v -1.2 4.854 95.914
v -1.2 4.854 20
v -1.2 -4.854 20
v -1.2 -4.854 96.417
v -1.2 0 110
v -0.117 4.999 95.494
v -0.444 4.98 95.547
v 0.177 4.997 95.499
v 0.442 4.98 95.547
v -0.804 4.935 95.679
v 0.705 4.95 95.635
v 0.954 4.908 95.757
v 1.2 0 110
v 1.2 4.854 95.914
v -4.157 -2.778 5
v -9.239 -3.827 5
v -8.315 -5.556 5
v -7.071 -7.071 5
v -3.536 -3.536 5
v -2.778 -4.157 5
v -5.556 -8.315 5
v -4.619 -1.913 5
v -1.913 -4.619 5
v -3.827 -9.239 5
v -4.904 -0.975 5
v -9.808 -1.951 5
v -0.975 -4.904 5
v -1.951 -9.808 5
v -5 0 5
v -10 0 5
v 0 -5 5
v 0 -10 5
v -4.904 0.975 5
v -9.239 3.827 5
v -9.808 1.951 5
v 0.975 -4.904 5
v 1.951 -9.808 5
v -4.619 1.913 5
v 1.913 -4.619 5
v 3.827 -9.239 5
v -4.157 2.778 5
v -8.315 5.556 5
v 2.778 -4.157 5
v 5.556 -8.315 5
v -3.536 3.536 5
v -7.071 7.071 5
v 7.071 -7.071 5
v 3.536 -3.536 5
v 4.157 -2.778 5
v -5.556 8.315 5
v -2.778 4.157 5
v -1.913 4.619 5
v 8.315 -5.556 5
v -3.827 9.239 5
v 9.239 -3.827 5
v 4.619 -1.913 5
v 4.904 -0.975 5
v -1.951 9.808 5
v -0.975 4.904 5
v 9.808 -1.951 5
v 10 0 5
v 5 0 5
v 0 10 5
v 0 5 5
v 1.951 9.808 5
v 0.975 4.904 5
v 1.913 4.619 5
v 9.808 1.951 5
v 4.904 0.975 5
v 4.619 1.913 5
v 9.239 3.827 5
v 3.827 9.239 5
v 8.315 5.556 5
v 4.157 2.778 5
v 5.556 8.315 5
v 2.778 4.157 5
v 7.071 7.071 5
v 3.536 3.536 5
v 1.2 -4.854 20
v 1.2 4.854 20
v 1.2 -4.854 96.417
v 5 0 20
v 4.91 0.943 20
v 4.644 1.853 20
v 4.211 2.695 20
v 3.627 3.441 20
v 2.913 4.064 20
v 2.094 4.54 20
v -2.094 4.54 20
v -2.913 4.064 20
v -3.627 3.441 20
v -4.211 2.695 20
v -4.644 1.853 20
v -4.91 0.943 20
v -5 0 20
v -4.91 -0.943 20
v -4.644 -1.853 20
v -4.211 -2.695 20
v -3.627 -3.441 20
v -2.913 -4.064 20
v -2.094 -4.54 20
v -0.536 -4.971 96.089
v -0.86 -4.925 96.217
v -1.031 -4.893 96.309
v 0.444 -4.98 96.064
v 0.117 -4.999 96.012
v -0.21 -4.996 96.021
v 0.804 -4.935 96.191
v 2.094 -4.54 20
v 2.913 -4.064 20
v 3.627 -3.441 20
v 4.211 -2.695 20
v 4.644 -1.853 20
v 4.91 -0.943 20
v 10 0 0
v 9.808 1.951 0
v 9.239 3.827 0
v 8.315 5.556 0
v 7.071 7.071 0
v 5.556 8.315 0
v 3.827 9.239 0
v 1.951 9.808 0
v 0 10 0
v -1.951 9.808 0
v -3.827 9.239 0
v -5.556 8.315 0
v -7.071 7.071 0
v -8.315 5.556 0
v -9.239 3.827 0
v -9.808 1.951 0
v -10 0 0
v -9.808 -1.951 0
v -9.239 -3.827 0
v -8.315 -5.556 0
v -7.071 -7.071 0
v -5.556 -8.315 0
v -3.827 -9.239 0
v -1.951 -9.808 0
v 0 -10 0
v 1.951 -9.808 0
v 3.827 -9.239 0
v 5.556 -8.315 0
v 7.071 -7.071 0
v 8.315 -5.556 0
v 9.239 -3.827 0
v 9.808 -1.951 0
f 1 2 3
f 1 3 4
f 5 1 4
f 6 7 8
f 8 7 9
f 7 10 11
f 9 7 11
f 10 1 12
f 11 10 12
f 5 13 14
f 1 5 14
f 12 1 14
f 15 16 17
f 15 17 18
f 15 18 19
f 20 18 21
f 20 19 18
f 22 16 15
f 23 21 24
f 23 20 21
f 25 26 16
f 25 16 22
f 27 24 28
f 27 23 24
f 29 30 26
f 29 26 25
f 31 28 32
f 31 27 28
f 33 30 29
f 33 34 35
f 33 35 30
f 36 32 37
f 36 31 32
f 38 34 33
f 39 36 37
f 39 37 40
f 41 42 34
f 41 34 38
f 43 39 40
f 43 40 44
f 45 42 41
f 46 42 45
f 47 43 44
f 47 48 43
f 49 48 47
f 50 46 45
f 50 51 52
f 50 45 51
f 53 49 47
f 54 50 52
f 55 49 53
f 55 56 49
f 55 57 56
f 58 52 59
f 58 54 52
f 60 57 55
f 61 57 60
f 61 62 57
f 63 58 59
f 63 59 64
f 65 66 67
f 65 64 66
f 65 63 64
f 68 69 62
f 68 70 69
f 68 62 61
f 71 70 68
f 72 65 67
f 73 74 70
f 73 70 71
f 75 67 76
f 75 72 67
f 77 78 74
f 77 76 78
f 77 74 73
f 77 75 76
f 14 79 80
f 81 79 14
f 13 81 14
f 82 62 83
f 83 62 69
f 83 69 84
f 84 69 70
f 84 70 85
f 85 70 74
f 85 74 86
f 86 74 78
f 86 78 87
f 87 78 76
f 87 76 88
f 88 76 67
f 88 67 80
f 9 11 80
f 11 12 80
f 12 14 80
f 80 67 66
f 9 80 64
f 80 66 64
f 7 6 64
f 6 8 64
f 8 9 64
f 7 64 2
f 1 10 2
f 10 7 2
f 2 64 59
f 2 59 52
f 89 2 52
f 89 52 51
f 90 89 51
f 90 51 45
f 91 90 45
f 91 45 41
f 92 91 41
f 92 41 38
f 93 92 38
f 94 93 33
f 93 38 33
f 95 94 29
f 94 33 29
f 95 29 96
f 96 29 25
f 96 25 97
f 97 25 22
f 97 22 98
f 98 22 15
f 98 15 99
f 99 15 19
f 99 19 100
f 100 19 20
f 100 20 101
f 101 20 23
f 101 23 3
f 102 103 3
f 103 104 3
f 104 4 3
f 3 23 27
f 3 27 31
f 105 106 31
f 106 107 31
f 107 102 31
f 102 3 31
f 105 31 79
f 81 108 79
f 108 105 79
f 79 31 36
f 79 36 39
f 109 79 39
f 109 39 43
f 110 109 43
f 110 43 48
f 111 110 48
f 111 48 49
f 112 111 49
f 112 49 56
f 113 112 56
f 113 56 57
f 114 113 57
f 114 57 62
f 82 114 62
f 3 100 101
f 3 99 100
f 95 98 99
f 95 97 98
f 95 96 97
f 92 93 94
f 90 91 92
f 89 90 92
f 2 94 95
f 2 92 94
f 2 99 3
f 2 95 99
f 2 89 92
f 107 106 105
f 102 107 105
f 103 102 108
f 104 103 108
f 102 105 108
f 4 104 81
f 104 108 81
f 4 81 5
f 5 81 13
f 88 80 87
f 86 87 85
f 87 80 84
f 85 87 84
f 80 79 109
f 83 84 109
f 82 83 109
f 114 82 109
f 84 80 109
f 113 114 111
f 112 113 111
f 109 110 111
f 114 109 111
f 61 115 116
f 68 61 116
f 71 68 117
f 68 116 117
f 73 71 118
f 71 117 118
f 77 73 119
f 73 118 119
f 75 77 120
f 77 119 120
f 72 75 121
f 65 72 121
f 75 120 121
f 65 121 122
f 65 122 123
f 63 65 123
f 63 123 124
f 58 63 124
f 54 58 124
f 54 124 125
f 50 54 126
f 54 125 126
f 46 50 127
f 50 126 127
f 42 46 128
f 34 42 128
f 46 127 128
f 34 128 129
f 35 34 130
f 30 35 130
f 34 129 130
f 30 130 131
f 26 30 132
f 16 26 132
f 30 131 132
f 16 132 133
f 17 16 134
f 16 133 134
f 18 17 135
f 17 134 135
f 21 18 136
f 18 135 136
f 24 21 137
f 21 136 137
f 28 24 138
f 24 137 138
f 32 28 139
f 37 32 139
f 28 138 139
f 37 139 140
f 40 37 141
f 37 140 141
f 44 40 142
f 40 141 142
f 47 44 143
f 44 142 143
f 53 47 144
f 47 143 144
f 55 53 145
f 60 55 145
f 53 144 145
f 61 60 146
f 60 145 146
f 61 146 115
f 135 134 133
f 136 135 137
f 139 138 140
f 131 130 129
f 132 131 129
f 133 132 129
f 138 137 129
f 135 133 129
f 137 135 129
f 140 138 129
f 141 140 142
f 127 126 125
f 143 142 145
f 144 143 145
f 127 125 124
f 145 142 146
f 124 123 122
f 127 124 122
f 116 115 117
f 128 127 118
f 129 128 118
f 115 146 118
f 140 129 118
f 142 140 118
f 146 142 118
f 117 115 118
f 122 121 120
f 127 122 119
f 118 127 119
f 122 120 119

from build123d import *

# Parameters (mm, degrees)
F0_R     = 5
F1_DEPTH = 125
F2_W     = 7.022222
F2_H     = 110
F3_DEPTH = 12.5
F6_DEPTH = 12.5
F0_R_2   = 10
F8_DEPTH = 5


with BuildPart() as f1:
    # F0 (on Top) → F1 (new body)
    with BuildSketch(Plane.XY):
        Circle(F0_R)
    extrude(amount=F1_DEPTH)


with BuildPart() as f3:
    # F2 (on Front) → F3 (new body, symmetric)
    with BuildSketch(Plane.XZ):
        with Locations((-4.711111, 75)):
            Rectangle(F2_W, F2_H)
        with Locations((4.711111, 75)):
            Rectangle(F2_W, F2_H)
    extrude(amount=F3_DEPTH, both=True)


with BuildPart() as f1_1:
    add(f1.part)

    # F4: cut F3
    add(f3.part, mode=Mode.SUBTRACT)


with BuildPart() as f6:
    # F5 (on Right) → F6 (new body, symmetric)
    with BuildSketch(Plane.YZ):
        Polygon((32.54493, 130), (-35.225107, 130), (-35.607988, 80), (-10.720685, 80), (0, 110), (10.337801, 80), (32.54493, 80), align=None)
    extrude(amount=F6_DEPTH, both=True)


with BuildPart() as f1_2:
    add(f1_1.part)

    # F7: cut F6
    add(f6.part, mode=Mode.SUBTRACT)

    # F0 (on Top) → F8 (join)
    with BuildSketch(Plane.XY):
        Circle(F0_R_2)
        Circle(F0_R, mode=Mode.SUBTRACT)
    extrude(amount=F8_DEPTH)


solid = f1_2.part
